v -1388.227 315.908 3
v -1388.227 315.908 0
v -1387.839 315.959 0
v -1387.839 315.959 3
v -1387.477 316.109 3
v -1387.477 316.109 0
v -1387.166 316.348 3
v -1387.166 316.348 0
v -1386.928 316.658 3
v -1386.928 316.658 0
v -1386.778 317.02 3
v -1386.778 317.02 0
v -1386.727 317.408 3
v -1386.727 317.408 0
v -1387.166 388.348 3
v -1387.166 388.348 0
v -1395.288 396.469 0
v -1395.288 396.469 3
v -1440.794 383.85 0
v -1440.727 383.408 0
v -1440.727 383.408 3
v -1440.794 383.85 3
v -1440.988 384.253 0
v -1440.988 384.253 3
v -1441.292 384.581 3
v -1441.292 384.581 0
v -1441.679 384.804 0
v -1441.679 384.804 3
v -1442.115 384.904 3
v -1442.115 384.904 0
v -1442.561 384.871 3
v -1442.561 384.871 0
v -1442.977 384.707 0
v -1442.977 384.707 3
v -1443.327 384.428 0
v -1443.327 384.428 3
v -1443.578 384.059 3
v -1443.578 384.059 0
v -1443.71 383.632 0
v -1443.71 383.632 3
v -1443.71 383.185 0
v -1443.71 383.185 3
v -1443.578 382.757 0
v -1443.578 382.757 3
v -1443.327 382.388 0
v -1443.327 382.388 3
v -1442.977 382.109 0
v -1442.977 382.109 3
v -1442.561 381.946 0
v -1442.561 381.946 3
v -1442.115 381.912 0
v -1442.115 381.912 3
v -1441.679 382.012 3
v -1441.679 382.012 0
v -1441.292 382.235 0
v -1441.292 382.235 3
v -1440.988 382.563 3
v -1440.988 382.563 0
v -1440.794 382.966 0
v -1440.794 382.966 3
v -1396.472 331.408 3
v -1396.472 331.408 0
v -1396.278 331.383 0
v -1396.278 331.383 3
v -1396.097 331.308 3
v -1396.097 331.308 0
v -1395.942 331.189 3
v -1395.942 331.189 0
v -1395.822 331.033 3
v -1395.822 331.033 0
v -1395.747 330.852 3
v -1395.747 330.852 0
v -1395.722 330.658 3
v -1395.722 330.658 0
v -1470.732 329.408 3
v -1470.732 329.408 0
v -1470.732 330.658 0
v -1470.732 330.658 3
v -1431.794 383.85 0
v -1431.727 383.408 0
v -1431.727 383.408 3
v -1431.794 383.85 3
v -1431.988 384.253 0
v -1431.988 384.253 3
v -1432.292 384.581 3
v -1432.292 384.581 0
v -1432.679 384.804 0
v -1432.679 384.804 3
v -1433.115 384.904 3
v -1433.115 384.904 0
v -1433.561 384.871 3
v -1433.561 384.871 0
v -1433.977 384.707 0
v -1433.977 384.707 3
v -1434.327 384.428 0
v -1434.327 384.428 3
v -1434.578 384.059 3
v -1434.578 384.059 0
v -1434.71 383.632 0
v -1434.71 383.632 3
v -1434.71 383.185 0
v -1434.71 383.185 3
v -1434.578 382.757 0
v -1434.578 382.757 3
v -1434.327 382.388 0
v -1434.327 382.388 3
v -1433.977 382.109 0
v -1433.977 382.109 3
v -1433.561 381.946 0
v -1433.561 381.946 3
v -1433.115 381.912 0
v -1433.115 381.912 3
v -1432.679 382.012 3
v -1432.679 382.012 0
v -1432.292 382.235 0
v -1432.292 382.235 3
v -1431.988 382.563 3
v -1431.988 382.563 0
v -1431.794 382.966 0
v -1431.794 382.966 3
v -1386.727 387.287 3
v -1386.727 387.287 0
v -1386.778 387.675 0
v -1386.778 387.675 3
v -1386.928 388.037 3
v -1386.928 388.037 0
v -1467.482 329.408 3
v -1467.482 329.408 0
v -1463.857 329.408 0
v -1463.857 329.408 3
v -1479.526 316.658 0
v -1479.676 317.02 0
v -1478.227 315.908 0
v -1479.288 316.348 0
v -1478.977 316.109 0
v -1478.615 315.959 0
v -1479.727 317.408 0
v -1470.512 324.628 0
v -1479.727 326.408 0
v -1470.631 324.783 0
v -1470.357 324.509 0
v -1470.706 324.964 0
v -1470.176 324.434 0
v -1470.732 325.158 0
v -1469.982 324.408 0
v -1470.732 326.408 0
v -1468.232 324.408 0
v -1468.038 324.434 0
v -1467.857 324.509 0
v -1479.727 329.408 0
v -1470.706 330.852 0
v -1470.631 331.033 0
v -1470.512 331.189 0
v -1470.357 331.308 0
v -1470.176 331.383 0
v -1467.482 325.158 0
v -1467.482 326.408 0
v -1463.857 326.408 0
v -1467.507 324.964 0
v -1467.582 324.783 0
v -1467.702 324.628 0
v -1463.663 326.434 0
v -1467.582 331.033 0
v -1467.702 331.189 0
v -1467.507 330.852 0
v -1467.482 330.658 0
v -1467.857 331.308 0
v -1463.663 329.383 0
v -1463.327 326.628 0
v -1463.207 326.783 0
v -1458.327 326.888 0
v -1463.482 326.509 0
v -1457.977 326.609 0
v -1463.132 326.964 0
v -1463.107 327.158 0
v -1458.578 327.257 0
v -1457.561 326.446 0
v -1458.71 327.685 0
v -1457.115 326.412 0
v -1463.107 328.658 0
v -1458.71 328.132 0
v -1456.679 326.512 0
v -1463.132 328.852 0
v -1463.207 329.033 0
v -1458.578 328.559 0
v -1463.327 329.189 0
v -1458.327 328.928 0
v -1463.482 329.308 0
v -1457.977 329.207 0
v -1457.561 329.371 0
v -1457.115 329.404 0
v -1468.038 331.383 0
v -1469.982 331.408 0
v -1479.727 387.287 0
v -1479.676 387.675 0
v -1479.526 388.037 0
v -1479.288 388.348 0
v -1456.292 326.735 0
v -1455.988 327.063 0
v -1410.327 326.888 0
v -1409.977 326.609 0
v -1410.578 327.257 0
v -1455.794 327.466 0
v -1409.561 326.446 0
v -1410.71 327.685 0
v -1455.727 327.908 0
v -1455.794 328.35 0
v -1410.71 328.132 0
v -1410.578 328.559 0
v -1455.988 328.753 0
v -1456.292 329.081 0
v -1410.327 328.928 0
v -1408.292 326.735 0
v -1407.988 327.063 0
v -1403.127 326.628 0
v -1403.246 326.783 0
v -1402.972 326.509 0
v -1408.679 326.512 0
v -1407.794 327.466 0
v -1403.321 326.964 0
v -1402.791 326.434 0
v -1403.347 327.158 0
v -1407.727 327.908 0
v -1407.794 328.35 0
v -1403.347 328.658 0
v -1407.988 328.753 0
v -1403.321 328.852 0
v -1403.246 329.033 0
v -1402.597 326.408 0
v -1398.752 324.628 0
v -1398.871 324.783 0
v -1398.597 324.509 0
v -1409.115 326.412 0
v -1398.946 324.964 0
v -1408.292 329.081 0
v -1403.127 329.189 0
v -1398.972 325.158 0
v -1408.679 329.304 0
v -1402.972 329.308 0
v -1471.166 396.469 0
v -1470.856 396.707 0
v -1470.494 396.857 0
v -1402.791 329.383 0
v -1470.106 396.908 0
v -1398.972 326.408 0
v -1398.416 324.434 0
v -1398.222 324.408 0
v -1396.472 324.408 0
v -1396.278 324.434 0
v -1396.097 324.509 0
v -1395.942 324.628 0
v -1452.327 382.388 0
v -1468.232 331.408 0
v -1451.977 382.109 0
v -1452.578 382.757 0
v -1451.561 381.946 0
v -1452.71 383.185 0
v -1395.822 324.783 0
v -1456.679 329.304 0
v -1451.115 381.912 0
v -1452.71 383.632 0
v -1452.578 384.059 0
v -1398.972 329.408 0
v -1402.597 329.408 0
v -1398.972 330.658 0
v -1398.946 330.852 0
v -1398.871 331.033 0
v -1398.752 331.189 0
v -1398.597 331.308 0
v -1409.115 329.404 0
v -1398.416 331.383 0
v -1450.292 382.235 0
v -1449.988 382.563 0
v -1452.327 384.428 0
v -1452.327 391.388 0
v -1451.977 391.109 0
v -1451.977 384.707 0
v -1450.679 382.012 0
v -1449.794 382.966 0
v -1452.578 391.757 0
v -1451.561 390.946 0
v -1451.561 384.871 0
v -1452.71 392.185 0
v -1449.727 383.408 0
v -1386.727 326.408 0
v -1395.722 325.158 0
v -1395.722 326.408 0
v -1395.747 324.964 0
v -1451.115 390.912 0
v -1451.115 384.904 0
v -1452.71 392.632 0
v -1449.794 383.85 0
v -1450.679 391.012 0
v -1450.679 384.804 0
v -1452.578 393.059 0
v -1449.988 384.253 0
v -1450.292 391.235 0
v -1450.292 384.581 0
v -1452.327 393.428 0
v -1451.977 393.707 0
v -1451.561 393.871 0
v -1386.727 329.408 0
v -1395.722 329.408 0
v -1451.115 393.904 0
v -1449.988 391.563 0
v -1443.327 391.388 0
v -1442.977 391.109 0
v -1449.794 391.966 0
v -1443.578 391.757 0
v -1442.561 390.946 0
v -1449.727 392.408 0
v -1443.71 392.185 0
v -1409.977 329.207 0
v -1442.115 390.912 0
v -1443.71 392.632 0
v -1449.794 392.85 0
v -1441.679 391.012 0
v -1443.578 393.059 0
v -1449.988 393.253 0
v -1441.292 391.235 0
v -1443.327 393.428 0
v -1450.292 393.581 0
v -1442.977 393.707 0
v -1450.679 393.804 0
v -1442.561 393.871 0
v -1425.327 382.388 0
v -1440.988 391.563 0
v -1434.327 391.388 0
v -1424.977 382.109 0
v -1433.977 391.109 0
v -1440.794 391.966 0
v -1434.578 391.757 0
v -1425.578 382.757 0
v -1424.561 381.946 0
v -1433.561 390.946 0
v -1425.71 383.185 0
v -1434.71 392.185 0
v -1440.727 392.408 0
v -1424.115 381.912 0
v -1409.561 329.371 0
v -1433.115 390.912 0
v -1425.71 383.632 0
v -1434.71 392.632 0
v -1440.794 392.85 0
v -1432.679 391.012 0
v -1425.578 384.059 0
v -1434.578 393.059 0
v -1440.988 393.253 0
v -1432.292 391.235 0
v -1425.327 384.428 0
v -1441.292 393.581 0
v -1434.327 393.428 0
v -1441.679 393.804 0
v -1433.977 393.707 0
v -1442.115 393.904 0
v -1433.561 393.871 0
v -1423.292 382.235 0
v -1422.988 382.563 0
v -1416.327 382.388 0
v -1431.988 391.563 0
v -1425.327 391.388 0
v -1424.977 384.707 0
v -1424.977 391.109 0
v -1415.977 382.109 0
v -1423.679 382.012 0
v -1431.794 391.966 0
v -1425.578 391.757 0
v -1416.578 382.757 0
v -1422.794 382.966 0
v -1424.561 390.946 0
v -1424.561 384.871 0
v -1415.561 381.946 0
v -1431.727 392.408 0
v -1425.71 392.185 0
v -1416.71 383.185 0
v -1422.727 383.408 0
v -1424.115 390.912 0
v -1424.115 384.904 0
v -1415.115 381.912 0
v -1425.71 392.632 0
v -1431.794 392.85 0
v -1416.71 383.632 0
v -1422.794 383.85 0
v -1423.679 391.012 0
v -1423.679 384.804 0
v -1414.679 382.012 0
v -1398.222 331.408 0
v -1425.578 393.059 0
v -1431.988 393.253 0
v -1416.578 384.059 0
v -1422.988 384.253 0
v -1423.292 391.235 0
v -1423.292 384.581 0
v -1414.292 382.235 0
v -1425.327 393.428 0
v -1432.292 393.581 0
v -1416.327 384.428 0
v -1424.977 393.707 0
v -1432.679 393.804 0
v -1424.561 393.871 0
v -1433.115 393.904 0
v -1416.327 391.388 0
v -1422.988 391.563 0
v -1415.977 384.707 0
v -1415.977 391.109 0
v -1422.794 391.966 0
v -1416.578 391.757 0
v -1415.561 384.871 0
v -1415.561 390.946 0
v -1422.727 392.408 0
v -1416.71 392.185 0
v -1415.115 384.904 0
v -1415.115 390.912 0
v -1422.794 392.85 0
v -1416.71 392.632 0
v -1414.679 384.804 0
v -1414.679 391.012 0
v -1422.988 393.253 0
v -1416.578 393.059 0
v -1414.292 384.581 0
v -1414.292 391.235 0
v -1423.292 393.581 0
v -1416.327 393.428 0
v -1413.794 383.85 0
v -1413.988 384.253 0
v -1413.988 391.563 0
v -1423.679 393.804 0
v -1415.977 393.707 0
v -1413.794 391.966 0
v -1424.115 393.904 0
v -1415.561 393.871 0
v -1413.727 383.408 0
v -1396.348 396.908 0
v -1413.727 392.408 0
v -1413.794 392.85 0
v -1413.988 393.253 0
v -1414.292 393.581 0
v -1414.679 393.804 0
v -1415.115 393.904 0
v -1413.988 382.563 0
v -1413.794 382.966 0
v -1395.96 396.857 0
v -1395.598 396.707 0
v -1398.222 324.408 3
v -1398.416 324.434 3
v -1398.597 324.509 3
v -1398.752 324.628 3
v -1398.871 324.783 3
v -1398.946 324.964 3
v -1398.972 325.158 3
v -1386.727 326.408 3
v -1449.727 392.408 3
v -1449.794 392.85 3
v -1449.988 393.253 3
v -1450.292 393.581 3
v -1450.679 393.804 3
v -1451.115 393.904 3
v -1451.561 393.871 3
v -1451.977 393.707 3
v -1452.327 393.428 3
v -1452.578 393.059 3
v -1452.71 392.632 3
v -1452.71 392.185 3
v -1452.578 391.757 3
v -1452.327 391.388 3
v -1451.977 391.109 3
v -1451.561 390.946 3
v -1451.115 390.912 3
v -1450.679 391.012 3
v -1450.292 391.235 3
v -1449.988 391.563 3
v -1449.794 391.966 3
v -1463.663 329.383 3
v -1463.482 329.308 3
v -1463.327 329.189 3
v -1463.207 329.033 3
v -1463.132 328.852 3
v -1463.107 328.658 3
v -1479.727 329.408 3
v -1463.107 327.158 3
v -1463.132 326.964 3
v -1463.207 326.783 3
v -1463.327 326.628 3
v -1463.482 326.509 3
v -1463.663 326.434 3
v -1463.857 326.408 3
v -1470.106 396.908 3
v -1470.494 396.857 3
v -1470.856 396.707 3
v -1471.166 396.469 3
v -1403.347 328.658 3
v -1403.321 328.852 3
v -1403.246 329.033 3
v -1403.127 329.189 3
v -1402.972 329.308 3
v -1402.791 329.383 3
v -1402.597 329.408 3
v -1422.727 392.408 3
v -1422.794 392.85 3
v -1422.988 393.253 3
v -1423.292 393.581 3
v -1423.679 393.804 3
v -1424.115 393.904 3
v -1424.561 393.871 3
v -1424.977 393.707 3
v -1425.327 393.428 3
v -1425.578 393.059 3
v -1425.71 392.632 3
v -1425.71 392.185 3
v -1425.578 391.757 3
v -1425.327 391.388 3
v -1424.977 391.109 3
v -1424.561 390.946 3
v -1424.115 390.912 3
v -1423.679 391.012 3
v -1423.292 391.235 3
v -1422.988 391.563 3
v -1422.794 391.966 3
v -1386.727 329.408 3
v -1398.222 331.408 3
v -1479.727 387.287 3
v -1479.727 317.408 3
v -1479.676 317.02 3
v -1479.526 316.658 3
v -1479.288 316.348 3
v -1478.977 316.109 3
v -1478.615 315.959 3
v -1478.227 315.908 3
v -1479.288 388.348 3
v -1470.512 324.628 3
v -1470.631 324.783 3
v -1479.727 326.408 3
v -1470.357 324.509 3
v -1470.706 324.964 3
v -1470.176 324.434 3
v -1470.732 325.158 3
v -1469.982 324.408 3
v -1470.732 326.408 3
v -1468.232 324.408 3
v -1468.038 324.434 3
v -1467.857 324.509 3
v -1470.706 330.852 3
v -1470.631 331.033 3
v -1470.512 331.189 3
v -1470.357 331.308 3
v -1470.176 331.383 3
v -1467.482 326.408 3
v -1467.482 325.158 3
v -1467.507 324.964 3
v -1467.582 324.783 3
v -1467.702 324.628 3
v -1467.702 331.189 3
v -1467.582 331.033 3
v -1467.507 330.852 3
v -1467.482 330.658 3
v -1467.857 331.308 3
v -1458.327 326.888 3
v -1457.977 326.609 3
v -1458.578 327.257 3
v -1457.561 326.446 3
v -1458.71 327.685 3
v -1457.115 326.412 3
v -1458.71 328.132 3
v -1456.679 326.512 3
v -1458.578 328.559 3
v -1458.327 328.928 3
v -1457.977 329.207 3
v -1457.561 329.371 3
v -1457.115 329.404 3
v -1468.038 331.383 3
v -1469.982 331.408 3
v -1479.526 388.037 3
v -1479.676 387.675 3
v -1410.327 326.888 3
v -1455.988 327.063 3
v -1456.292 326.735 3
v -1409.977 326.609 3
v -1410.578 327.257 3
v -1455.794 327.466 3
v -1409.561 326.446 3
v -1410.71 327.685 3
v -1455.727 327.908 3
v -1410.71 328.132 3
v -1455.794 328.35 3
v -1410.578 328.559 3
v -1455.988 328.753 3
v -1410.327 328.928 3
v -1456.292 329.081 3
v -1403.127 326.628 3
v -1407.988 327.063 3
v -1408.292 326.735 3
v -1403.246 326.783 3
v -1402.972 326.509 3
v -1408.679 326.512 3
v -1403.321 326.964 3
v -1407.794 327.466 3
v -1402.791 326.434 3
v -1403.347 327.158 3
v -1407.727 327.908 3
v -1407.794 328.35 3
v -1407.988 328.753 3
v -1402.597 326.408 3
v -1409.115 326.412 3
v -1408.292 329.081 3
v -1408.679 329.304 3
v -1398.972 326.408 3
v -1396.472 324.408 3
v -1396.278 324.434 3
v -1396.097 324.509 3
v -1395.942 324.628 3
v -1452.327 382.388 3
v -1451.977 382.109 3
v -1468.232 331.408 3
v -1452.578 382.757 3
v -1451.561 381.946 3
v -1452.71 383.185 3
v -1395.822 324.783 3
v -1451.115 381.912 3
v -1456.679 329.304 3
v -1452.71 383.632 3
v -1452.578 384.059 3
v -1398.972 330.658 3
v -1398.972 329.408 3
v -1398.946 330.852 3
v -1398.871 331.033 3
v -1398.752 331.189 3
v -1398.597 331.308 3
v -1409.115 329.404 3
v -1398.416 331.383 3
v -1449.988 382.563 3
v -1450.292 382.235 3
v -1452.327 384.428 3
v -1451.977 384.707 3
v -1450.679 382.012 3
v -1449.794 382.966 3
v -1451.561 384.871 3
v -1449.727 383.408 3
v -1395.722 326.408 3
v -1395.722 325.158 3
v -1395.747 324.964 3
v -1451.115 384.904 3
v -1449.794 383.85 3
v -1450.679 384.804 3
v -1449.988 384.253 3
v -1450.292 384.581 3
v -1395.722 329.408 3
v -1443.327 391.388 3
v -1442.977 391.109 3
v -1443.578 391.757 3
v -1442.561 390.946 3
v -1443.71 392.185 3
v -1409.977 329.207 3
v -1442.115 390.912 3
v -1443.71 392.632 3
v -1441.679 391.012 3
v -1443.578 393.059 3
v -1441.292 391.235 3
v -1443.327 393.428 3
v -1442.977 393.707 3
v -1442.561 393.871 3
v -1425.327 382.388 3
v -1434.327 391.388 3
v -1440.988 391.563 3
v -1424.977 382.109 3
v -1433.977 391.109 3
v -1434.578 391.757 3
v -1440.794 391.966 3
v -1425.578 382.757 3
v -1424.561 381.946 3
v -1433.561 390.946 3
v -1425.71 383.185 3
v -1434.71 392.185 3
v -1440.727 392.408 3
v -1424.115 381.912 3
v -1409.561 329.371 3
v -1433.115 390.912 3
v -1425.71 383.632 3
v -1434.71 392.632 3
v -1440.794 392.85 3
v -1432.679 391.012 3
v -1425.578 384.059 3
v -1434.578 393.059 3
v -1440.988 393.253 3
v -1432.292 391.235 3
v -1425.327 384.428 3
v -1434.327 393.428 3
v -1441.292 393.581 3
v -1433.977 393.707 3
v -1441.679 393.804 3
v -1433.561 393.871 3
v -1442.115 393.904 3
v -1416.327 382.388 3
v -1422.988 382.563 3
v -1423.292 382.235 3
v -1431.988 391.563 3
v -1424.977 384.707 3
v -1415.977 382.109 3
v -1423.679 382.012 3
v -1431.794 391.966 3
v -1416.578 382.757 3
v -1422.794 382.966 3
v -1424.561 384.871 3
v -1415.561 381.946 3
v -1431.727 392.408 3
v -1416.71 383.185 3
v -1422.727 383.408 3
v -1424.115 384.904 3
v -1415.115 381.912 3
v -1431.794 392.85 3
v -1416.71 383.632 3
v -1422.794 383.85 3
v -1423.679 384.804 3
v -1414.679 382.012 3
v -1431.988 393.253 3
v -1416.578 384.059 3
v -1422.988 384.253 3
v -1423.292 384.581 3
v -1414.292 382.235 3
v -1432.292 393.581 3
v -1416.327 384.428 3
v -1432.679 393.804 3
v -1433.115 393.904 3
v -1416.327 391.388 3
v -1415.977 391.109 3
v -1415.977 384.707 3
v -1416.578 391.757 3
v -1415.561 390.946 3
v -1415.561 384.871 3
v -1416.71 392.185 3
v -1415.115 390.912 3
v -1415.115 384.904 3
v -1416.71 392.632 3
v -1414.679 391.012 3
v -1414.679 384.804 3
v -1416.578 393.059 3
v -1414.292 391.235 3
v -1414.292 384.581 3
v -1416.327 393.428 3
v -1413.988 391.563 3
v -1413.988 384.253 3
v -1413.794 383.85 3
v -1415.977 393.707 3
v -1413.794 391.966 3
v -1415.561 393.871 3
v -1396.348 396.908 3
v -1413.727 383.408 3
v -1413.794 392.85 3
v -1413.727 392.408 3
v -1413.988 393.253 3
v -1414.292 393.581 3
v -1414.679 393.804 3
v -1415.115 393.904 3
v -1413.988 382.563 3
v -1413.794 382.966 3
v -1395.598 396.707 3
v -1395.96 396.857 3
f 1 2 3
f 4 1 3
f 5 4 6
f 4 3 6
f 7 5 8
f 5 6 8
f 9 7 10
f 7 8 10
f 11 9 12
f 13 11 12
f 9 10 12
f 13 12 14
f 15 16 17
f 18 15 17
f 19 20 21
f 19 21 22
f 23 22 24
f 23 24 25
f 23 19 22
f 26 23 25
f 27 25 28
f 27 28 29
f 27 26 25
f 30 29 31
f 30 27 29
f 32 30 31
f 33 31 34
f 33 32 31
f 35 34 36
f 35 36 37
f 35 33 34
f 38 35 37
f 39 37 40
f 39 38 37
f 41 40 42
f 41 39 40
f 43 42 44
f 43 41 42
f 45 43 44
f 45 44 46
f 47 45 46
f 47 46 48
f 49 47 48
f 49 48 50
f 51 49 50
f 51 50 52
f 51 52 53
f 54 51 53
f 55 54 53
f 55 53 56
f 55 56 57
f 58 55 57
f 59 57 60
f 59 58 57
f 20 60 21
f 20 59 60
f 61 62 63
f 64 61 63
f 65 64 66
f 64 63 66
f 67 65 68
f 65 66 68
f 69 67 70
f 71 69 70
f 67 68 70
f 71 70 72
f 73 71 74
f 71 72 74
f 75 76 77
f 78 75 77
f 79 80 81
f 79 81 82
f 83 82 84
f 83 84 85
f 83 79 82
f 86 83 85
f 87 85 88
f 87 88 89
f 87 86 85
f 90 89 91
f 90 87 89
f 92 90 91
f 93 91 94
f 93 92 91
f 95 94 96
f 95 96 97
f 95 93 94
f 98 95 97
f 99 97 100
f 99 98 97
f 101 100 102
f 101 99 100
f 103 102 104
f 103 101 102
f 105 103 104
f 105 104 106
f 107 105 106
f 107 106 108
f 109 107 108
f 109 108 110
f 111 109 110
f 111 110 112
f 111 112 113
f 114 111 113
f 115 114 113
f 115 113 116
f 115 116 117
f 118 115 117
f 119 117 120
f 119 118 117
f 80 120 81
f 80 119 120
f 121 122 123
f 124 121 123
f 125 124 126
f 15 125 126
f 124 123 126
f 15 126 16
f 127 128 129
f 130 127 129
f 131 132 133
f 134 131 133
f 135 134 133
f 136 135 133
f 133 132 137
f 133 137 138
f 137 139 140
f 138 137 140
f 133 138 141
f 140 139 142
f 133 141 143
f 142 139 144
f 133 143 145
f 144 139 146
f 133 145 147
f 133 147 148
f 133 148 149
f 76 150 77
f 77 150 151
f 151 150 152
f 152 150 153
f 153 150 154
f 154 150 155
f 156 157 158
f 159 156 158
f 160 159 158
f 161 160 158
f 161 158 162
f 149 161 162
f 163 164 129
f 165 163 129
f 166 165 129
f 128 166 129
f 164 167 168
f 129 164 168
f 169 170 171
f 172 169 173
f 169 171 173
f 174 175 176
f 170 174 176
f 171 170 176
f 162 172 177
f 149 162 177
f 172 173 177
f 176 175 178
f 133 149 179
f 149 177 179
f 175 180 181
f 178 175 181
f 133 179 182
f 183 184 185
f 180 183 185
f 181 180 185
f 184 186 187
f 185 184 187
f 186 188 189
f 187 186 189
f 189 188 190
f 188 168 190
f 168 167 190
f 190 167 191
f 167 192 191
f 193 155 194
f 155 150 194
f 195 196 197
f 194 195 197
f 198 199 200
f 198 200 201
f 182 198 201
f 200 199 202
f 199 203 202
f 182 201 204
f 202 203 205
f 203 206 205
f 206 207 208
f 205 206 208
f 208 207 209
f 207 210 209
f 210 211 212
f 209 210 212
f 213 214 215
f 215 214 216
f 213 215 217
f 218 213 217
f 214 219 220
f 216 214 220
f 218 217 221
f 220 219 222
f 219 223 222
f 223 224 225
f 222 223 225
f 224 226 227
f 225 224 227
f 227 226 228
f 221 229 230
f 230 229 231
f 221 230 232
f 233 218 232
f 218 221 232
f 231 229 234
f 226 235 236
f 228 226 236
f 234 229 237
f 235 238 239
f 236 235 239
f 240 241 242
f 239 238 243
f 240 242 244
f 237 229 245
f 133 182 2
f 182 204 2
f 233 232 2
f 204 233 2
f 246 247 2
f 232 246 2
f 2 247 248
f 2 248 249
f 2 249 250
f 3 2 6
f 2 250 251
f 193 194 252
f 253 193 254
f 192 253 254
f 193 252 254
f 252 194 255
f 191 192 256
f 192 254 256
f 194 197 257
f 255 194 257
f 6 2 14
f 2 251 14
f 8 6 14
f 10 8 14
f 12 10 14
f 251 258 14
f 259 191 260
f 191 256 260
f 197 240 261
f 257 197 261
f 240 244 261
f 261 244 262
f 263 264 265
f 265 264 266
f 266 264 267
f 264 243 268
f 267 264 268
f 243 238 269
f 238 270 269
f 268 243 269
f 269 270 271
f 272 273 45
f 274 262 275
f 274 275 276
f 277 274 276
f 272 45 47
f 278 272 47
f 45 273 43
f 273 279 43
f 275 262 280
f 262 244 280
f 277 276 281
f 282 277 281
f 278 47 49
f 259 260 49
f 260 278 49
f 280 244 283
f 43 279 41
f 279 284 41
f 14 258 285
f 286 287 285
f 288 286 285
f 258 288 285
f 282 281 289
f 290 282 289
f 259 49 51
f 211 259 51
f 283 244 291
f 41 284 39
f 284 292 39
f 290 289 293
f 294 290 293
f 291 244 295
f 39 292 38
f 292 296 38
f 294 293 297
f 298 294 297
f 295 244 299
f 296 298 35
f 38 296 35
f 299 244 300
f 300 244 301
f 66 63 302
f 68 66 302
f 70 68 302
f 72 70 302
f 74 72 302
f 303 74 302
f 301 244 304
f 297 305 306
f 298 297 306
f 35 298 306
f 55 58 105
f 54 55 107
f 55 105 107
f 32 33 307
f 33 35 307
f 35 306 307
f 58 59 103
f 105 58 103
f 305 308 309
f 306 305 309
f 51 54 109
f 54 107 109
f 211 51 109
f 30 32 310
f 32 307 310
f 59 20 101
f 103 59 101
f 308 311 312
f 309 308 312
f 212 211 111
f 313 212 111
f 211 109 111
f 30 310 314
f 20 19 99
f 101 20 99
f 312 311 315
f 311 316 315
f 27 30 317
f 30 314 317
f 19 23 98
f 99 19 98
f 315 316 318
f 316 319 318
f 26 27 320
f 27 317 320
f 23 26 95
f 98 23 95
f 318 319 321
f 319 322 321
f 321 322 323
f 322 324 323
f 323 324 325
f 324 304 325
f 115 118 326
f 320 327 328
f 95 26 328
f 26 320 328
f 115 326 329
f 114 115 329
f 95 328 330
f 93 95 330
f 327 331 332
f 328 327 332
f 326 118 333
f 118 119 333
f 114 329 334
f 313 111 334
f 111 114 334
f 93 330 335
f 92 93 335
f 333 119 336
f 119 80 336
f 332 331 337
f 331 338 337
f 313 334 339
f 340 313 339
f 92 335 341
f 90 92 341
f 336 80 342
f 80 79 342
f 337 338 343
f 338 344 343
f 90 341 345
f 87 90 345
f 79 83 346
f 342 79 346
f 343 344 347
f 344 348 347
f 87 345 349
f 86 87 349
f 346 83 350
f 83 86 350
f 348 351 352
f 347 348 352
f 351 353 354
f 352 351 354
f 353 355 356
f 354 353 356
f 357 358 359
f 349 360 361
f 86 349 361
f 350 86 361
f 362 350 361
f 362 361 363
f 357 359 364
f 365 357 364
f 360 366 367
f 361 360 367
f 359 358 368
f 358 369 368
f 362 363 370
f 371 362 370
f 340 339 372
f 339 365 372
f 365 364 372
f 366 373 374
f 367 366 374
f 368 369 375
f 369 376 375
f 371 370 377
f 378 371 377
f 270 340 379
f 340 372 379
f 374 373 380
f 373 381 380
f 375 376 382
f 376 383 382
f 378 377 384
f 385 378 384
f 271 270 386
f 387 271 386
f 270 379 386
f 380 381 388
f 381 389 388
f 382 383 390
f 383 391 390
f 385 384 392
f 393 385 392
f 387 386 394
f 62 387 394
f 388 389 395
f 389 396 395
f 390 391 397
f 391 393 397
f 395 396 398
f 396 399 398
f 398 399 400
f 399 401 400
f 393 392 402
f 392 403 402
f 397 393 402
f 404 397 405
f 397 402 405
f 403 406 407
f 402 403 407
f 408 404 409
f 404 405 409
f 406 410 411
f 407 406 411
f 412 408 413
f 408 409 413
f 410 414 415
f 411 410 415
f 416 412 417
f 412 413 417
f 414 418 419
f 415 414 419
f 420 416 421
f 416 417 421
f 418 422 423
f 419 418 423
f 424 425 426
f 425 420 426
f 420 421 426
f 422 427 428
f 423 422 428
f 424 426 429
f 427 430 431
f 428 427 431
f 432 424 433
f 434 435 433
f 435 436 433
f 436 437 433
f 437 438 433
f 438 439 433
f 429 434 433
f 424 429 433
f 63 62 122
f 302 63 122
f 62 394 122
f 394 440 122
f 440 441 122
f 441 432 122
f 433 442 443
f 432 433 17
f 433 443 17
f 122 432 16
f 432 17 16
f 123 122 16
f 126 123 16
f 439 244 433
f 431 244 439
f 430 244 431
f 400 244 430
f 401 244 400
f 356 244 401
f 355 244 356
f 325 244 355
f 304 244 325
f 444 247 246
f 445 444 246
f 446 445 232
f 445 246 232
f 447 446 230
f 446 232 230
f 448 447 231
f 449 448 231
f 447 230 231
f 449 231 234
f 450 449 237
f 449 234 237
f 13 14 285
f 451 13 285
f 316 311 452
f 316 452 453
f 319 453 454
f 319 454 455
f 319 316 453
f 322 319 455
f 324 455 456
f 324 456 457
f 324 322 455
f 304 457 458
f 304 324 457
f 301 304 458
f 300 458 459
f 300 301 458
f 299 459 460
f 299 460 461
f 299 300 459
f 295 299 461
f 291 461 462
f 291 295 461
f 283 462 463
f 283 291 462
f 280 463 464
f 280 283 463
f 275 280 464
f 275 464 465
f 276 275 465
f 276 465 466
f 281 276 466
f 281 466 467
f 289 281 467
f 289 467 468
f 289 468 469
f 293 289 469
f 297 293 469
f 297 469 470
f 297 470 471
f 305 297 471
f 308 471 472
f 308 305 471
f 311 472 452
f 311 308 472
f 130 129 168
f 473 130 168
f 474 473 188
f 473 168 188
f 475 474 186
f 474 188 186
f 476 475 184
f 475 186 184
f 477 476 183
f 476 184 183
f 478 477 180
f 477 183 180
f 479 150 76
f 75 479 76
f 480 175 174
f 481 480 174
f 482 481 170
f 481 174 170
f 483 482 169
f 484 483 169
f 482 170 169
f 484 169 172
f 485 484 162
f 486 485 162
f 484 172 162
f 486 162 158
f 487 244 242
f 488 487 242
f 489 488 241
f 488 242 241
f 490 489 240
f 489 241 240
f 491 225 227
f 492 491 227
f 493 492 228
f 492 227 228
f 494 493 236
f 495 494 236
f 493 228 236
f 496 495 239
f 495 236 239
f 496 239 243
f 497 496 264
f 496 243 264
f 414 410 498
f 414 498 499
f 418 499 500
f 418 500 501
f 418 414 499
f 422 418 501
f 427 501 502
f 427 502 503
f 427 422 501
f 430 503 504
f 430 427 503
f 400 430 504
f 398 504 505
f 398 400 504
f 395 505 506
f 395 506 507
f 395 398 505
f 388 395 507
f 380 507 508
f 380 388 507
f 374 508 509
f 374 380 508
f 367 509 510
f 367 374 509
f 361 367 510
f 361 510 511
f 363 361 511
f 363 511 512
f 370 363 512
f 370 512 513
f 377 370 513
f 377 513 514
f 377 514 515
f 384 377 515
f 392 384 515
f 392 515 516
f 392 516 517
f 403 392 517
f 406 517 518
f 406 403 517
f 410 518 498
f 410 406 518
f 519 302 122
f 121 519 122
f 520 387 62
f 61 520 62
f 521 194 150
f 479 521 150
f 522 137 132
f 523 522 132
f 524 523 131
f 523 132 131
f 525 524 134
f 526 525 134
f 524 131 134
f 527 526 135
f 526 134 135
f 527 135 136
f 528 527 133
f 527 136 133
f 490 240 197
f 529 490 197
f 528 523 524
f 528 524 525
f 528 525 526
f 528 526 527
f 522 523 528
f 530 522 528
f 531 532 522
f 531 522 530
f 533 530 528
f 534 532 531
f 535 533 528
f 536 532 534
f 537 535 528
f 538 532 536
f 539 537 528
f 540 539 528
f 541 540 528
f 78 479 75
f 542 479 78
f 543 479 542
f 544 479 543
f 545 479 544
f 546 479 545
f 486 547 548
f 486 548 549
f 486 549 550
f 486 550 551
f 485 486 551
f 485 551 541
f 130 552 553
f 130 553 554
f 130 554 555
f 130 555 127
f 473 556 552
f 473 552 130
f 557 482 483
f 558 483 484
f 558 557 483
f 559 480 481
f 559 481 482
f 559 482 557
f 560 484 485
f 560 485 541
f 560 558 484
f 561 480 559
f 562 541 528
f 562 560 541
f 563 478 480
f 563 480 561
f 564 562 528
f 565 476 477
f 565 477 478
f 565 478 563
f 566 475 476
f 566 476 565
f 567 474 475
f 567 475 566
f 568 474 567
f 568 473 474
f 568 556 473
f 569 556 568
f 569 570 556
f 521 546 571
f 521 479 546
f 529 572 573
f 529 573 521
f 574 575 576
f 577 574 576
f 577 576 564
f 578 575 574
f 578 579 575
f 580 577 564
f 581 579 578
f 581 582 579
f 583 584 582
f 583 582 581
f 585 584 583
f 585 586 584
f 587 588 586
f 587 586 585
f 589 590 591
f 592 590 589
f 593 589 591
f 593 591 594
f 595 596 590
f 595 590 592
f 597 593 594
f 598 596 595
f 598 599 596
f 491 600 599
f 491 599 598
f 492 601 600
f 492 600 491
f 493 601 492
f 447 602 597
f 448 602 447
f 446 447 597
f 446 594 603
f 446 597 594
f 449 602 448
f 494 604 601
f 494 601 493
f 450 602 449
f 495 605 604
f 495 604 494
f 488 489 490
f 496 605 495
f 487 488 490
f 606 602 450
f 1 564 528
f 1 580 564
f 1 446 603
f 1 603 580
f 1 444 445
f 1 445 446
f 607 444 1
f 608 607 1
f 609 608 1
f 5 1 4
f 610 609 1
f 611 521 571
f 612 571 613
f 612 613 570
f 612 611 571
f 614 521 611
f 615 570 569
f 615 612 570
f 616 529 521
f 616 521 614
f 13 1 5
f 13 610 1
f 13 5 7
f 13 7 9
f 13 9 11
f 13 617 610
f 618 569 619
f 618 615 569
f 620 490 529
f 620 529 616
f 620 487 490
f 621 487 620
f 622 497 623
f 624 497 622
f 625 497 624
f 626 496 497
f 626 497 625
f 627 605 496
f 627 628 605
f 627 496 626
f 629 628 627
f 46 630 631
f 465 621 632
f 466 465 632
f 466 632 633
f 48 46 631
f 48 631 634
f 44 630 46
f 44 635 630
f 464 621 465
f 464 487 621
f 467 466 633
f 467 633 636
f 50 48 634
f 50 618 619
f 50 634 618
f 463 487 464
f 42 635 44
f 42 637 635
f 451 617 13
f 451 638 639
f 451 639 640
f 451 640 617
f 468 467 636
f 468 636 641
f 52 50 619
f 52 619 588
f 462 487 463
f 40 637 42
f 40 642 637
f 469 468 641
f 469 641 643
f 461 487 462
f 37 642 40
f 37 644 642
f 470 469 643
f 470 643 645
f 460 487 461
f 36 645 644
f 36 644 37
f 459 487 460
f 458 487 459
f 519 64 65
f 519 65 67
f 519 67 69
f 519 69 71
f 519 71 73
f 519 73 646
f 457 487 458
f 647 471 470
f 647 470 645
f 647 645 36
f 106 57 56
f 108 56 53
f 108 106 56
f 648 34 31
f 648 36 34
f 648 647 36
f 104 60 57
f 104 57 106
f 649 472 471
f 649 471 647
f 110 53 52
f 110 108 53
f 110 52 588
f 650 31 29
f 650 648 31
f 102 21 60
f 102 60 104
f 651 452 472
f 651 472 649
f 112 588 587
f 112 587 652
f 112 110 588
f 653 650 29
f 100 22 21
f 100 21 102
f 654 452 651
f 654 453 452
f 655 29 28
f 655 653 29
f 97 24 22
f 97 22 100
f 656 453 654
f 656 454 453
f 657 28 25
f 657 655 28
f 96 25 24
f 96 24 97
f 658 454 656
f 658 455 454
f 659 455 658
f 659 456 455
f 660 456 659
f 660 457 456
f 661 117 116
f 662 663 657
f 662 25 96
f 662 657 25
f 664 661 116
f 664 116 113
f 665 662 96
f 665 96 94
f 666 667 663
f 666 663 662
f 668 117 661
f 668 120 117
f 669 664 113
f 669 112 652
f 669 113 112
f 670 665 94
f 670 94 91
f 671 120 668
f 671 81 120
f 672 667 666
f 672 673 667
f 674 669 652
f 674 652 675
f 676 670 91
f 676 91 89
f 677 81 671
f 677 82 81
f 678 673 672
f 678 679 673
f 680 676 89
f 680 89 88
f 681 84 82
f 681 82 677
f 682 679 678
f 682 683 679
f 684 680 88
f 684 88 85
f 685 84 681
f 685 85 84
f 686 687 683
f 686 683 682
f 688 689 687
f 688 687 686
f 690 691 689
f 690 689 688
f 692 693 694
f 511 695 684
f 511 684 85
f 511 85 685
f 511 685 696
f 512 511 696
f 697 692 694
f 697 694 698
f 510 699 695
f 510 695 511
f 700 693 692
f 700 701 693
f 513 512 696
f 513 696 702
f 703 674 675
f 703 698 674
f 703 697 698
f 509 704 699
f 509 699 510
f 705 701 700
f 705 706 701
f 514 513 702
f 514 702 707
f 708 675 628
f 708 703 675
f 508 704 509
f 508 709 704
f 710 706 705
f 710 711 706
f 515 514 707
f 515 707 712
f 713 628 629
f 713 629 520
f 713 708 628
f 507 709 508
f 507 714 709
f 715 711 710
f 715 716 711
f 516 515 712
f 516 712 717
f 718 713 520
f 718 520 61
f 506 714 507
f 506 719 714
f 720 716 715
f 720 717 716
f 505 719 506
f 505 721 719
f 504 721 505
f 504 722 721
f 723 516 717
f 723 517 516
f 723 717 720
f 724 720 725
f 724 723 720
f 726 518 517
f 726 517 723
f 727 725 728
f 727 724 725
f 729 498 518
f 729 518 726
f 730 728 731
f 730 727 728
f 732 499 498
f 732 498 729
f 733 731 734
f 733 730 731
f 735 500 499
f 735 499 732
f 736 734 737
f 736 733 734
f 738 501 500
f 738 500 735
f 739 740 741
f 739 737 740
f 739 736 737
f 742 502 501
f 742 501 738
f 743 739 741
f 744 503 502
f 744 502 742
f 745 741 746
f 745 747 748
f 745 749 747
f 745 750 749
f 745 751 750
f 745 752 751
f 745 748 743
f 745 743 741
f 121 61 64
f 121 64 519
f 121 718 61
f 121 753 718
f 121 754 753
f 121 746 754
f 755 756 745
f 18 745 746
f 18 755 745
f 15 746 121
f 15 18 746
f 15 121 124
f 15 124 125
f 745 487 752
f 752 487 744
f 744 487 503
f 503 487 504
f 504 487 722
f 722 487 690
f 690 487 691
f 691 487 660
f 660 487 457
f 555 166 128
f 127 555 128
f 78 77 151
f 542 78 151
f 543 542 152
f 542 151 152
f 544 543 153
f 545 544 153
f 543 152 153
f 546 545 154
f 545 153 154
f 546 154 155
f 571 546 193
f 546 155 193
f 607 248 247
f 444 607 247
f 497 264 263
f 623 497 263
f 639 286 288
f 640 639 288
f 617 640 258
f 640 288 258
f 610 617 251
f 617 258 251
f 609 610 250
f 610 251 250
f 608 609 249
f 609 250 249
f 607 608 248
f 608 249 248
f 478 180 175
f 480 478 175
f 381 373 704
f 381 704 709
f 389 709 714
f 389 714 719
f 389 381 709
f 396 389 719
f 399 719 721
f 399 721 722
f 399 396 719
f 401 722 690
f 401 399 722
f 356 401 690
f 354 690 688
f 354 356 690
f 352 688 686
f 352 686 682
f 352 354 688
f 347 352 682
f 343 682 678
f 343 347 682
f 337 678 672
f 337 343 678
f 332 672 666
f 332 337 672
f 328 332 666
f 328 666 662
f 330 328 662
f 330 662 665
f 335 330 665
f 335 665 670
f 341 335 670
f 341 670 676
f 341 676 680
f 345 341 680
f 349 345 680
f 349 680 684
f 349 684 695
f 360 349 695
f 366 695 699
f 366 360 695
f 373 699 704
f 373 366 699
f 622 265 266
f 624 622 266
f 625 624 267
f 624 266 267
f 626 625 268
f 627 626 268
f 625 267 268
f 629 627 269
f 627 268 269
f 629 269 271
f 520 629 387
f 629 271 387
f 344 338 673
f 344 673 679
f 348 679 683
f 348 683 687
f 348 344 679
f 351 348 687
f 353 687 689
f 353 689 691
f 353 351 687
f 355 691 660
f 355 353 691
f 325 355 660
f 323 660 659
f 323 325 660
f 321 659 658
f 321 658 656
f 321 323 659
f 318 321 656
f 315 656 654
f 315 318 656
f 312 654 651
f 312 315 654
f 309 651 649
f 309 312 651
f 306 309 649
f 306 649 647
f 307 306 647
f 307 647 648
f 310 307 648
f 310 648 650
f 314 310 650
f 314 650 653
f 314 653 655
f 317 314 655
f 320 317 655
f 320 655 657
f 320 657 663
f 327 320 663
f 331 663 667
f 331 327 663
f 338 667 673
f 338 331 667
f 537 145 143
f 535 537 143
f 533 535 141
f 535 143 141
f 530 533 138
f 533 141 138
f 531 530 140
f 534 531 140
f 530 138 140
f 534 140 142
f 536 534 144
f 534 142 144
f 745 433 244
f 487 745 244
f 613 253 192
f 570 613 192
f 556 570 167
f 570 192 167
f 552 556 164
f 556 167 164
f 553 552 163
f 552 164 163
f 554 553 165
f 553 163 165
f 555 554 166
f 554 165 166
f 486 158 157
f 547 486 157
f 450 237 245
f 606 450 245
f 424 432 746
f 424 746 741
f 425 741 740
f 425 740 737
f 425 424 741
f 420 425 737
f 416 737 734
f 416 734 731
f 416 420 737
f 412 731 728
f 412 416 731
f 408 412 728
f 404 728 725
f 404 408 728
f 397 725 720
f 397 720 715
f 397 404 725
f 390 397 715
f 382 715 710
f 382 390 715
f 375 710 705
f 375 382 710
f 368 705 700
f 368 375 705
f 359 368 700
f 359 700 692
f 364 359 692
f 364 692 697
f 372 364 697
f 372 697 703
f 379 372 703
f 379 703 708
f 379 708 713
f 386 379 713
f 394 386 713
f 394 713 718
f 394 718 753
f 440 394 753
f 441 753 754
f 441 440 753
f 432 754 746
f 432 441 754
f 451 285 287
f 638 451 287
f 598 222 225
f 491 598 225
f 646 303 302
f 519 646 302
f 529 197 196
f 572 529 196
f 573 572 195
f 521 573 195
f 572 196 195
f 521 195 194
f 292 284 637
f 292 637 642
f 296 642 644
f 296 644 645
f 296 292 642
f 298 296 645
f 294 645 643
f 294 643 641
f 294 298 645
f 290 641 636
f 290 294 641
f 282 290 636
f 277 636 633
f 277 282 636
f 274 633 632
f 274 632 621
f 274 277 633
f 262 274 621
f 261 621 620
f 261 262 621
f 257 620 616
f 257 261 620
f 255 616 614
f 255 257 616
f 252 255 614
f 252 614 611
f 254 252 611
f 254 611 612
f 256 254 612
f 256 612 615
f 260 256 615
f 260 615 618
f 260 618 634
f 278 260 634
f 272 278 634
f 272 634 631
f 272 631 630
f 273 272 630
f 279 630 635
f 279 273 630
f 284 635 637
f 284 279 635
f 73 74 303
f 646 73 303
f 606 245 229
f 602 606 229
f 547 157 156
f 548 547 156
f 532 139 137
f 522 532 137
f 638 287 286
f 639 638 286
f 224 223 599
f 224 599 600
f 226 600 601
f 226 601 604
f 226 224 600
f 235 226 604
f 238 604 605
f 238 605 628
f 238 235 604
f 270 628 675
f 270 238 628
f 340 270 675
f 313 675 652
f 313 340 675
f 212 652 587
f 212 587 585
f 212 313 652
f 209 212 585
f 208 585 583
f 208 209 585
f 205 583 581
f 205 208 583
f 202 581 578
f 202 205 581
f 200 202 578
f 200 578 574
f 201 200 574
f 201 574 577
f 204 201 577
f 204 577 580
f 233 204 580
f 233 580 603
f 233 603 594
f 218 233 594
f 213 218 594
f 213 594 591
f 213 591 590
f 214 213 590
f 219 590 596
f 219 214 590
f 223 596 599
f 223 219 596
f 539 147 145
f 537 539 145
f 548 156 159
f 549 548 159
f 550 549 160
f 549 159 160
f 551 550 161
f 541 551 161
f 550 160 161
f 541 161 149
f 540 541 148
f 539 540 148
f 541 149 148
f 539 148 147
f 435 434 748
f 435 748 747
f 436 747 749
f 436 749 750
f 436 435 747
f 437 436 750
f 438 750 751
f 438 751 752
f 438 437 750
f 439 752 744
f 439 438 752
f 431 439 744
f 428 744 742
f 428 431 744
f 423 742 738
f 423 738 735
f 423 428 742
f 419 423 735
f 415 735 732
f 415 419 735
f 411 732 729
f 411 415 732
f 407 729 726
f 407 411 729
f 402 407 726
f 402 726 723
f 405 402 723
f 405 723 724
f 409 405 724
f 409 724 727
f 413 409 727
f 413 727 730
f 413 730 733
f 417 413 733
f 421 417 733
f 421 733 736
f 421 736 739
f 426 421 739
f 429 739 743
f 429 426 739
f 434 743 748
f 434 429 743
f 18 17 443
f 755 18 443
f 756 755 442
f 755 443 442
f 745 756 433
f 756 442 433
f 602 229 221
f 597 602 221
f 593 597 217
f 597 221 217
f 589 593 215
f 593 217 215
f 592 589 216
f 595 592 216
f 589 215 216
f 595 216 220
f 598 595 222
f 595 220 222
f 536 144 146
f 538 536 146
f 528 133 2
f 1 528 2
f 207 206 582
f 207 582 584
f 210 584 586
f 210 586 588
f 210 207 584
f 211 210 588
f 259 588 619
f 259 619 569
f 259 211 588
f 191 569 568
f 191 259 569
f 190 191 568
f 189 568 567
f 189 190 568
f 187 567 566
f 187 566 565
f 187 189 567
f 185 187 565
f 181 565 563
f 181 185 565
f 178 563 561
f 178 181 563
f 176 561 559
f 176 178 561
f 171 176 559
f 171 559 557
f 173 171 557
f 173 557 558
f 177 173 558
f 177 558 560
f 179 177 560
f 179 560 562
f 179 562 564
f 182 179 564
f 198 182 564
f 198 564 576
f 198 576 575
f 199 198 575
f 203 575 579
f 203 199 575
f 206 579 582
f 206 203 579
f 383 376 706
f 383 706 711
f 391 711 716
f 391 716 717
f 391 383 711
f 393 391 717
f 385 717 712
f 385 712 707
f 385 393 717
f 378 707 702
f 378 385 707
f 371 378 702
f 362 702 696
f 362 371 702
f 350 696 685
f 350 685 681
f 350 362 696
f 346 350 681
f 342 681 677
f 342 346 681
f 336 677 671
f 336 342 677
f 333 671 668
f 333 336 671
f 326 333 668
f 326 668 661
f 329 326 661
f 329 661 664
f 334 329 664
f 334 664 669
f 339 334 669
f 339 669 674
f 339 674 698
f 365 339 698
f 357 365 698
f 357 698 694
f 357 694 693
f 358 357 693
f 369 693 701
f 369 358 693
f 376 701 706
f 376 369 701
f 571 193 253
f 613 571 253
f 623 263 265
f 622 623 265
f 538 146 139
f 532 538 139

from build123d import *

# Parameters (mm, degrees)
MODEL_R                 = 1.5
SALIENTE_EXTRUIR1_DEPTH = 3


with BuildPart() as part:
    # Model → Saliente-Extruir1 (new body)
    with BuildSketch(Plane.XY):
        with BuildLine():
            Line((-1396.348255289, 396.908179756), (-1470.105614602, 396.908179756))
            ThreePointArc((-1470.105614602, 396.908179756), (-1470.679639751, 396.793999055), (-1471.166274774, 396.468839928))
            Line((-1471.166274774, 396.468839928), (-1479.287595118, 388.347519585))
            ThreePointArc((-1479.287595118, 388.347519585), (-1479.612754245, 387.860884562), (-1479.726934946, 387.286859413))
            Line((-1479.726934946, 387.286859413), (-1479.726934946, 329.408179756))
            Line((-1479.726934946, 329.408179756), (-1470.731934946, 329.408179756))
            Line((-1470.731934946, 329.408179756), (-1470.731934946, 330.658179756))
            ThreePointArc((-1470.731934946, 330.658179756), (-1470.512265032, 331.188509842), (-1469.981934946, 331.408179756))
            Line((-1469.981934946, 331.408179756), (-1468.231934946, 331.408179756))
            ThreePointArc((-1468.231934946, 331.408179756), (-1467.70160486, 331.188509842), (-1467.481934946, 330.658179756))
            Line((-1467.481934946, 330.658179756), (-1467.481934946, 329.408179756))
            Line((-1467.481934946, 329.408179756), (-1463.856934946, 329.408179756))
            ThreePointArc((-1463.856934946, 329.408179756), (-1463.32660486, 329.188509842), (-1463.106934946, 328.658179756))
            Line((-1463.106934946, 328.658179756), (-1463.106934946, 327.158179756))
            ThreePointArc((-1463.106934946, 327.158179756), (-1463.32660486, 326.627849671), (-1463.856934946, 326.408179756))
            Line((-1463.856934946, 326.408179756), (-1467.481934946, 326.408179756))
            Line((-1467.481934946, 326.408179756), (-1467.481934946, 325.158179756))
            ThreePointArc((-1467.481934946, 325.158179756), (-1467.70160486, 324.627849671), (-1468.231934946, 324.408179756))
            Line((-1468.231934946, 324.408179756), (-1469.981934946, 324.408179756))
            ThreePointArc((-1469.981934946, 324.408179756), (-1470.512265032, 324.627849671), (-1470.731934946, 325.158179756))
            Line((-1470.731934946, 325.158179756), (-1470.731934946, 326.408179756))
            Line((-1470.731934946, 326.408179756), (-1479.726934946, 326.408179756))
            Line((-1479.726934946, 326.408179756), (-1479.726934946, 317.408179756))
            ThreePointArc((-1479.726934946, 317.408179756), (-1479.287595118, 316.347519585), (-1478.226934946, 315.908179756))
            Line((-1478.226934946, 315.908179756), (-1388.226934946, 315.908179756))
            ThreePointArc((-1388.226934946, 315.908179756), (-1387.166274774, 316.347519585), (-1386.726934946, 317.408179756))
            Line((-1386.726934946, 317.408179756), (-1386.726934946, 326.408179756))
            Line((-1386.726934946, 326.408179756), (-1395.721934946, 326.408179756))
            Line((-1395.721934946, 326.408179756), (-1395.721934946, 325.158179756))
            ThreePointArc((-1395.721934946, 325.158179756), (-1395.94160486, 324.627849671), (-1396.471934946, 324.408179756))
            Line((-1396.471934946, 324.408179756), (-1398.221934946, 324.408179756))
            ThreePointArc((-1398.221934946, 324.408179756), (-1398.752265032, 324.627849671), (-1398.971934946, 325.158179756))
            Line((-1398.971934946, 325.158179756), (-1398.971934946, 326.408179756))
            Line((-1398.971934946, 326.408179756), (-1402.596934946, 326.408179756))
            ThreePointArc((-1402.596934946, 326.408179756), (-1403.127265032, 326.627849671), (-1403.346934946, 327.158179756))
            Line((-1403.346934946, 327.158179756), (-1403.346934946, 328.658179756))
            ThreePointArc((-1403.346934946, 328.658179756), (-1403.127265032, 329.188509842), (-1402.596934946, 329.408179756))
            Line((-1402.596934946, 329.408179756), (-1398.971934946, 329.408179756))
            Line((-1398.971934946, 329.408179756), (-1398.971934946, 330.658179756))
            ThreePointArc((-1398.971934946, 330.658179756), (-1398.752265032, 331.188509842), (-1398.221934946, 331.408179756))
            Line((-1398.221934946, 331.408179756), (-1396.471934946, 331.408179756))
            ThreePointArc((-1396.471934946, 331.408179756), (-1395.94160486, 331.188509842), (-1395.721934946, 330.658179756))
            Line((-1395.721934946, 330.658179756), (-1395.721934946, 329.408179756))
            Line((-1395.721934946, 329.408179756), (-1386.726934946, 329.408179756))
            Line((-1386.726934946, 329.408179756), (-1386.726934946, 387.286859413))
            ThreePointArc((-1386.726934946, 387.286859413), (-1386.841115647, 387.860884562), (-1387.166274774, 388.347519585))
            Line((-1387.166274774, 388.347519585), (-1395.287595118, 396.468839928))
            ThreePointArc((-1395.287595118, 396.468839928), (-1395.774230141, 396.793999055), (-1396.348255289, 396.908179756))
        make_face()
        with Locations((-1433.226934946, 392.408179756)):
            Circle(MODEL_R, mode=Mode.SUBTRACT)
        with Locations((-1451.226934946, 392.408179756)):
            Circle(MODEL_R, mode=Mode.SUBTRACT)
        with Locations((-1442.226934946, 392.408179756)):
            Circle(MODEL_R, mode=Mode.SUBTRACT)
        with Locations((-1442.226934946, 383.408179756)):
            Circle(MODEL_R, mode=Mode.SUBTRACT)
        with Locations((-1433.226934946, 383.408179756)):
            Circle(MODEL_R, mode=Mode.SUBTRACT)
        with Locations((-1451.226934946, 383.408179756)):
            Circle(MODEL_R, mode=Mode.SUBTRACT)
        with Locations((-1424.226934946, 392.408179756)):
            Circle(MODEL_R, mode=Mode.SUBTRACT)
        with Locations((-1415.226934946, 392.408179756)):
            Circle(MODEL_R, mode=Mode.SUBTRACT)
        with Locations((-1424.226934946, 383.408179756)):
            Circle(MODEL_R, mode=Mode.SUBTRACT)
        with Locations((-1457.226934946, 327.908179756)):
            Circle(MODEL_R, mode=Mode.SUBTRACT)
        with Locations((-1409.226934946, 327.908179756)):
            Circle(MODEL_R, mode=Mode.SUBTRACT)
        with Locations((-1415.226934946, 383.408179756)):
            Circle(MODEL_R, mode=Mode.SUBTRACT)
    extrude(amount=SALIENTE_EXTRUIR1_DEPTH)


solid = part.part
